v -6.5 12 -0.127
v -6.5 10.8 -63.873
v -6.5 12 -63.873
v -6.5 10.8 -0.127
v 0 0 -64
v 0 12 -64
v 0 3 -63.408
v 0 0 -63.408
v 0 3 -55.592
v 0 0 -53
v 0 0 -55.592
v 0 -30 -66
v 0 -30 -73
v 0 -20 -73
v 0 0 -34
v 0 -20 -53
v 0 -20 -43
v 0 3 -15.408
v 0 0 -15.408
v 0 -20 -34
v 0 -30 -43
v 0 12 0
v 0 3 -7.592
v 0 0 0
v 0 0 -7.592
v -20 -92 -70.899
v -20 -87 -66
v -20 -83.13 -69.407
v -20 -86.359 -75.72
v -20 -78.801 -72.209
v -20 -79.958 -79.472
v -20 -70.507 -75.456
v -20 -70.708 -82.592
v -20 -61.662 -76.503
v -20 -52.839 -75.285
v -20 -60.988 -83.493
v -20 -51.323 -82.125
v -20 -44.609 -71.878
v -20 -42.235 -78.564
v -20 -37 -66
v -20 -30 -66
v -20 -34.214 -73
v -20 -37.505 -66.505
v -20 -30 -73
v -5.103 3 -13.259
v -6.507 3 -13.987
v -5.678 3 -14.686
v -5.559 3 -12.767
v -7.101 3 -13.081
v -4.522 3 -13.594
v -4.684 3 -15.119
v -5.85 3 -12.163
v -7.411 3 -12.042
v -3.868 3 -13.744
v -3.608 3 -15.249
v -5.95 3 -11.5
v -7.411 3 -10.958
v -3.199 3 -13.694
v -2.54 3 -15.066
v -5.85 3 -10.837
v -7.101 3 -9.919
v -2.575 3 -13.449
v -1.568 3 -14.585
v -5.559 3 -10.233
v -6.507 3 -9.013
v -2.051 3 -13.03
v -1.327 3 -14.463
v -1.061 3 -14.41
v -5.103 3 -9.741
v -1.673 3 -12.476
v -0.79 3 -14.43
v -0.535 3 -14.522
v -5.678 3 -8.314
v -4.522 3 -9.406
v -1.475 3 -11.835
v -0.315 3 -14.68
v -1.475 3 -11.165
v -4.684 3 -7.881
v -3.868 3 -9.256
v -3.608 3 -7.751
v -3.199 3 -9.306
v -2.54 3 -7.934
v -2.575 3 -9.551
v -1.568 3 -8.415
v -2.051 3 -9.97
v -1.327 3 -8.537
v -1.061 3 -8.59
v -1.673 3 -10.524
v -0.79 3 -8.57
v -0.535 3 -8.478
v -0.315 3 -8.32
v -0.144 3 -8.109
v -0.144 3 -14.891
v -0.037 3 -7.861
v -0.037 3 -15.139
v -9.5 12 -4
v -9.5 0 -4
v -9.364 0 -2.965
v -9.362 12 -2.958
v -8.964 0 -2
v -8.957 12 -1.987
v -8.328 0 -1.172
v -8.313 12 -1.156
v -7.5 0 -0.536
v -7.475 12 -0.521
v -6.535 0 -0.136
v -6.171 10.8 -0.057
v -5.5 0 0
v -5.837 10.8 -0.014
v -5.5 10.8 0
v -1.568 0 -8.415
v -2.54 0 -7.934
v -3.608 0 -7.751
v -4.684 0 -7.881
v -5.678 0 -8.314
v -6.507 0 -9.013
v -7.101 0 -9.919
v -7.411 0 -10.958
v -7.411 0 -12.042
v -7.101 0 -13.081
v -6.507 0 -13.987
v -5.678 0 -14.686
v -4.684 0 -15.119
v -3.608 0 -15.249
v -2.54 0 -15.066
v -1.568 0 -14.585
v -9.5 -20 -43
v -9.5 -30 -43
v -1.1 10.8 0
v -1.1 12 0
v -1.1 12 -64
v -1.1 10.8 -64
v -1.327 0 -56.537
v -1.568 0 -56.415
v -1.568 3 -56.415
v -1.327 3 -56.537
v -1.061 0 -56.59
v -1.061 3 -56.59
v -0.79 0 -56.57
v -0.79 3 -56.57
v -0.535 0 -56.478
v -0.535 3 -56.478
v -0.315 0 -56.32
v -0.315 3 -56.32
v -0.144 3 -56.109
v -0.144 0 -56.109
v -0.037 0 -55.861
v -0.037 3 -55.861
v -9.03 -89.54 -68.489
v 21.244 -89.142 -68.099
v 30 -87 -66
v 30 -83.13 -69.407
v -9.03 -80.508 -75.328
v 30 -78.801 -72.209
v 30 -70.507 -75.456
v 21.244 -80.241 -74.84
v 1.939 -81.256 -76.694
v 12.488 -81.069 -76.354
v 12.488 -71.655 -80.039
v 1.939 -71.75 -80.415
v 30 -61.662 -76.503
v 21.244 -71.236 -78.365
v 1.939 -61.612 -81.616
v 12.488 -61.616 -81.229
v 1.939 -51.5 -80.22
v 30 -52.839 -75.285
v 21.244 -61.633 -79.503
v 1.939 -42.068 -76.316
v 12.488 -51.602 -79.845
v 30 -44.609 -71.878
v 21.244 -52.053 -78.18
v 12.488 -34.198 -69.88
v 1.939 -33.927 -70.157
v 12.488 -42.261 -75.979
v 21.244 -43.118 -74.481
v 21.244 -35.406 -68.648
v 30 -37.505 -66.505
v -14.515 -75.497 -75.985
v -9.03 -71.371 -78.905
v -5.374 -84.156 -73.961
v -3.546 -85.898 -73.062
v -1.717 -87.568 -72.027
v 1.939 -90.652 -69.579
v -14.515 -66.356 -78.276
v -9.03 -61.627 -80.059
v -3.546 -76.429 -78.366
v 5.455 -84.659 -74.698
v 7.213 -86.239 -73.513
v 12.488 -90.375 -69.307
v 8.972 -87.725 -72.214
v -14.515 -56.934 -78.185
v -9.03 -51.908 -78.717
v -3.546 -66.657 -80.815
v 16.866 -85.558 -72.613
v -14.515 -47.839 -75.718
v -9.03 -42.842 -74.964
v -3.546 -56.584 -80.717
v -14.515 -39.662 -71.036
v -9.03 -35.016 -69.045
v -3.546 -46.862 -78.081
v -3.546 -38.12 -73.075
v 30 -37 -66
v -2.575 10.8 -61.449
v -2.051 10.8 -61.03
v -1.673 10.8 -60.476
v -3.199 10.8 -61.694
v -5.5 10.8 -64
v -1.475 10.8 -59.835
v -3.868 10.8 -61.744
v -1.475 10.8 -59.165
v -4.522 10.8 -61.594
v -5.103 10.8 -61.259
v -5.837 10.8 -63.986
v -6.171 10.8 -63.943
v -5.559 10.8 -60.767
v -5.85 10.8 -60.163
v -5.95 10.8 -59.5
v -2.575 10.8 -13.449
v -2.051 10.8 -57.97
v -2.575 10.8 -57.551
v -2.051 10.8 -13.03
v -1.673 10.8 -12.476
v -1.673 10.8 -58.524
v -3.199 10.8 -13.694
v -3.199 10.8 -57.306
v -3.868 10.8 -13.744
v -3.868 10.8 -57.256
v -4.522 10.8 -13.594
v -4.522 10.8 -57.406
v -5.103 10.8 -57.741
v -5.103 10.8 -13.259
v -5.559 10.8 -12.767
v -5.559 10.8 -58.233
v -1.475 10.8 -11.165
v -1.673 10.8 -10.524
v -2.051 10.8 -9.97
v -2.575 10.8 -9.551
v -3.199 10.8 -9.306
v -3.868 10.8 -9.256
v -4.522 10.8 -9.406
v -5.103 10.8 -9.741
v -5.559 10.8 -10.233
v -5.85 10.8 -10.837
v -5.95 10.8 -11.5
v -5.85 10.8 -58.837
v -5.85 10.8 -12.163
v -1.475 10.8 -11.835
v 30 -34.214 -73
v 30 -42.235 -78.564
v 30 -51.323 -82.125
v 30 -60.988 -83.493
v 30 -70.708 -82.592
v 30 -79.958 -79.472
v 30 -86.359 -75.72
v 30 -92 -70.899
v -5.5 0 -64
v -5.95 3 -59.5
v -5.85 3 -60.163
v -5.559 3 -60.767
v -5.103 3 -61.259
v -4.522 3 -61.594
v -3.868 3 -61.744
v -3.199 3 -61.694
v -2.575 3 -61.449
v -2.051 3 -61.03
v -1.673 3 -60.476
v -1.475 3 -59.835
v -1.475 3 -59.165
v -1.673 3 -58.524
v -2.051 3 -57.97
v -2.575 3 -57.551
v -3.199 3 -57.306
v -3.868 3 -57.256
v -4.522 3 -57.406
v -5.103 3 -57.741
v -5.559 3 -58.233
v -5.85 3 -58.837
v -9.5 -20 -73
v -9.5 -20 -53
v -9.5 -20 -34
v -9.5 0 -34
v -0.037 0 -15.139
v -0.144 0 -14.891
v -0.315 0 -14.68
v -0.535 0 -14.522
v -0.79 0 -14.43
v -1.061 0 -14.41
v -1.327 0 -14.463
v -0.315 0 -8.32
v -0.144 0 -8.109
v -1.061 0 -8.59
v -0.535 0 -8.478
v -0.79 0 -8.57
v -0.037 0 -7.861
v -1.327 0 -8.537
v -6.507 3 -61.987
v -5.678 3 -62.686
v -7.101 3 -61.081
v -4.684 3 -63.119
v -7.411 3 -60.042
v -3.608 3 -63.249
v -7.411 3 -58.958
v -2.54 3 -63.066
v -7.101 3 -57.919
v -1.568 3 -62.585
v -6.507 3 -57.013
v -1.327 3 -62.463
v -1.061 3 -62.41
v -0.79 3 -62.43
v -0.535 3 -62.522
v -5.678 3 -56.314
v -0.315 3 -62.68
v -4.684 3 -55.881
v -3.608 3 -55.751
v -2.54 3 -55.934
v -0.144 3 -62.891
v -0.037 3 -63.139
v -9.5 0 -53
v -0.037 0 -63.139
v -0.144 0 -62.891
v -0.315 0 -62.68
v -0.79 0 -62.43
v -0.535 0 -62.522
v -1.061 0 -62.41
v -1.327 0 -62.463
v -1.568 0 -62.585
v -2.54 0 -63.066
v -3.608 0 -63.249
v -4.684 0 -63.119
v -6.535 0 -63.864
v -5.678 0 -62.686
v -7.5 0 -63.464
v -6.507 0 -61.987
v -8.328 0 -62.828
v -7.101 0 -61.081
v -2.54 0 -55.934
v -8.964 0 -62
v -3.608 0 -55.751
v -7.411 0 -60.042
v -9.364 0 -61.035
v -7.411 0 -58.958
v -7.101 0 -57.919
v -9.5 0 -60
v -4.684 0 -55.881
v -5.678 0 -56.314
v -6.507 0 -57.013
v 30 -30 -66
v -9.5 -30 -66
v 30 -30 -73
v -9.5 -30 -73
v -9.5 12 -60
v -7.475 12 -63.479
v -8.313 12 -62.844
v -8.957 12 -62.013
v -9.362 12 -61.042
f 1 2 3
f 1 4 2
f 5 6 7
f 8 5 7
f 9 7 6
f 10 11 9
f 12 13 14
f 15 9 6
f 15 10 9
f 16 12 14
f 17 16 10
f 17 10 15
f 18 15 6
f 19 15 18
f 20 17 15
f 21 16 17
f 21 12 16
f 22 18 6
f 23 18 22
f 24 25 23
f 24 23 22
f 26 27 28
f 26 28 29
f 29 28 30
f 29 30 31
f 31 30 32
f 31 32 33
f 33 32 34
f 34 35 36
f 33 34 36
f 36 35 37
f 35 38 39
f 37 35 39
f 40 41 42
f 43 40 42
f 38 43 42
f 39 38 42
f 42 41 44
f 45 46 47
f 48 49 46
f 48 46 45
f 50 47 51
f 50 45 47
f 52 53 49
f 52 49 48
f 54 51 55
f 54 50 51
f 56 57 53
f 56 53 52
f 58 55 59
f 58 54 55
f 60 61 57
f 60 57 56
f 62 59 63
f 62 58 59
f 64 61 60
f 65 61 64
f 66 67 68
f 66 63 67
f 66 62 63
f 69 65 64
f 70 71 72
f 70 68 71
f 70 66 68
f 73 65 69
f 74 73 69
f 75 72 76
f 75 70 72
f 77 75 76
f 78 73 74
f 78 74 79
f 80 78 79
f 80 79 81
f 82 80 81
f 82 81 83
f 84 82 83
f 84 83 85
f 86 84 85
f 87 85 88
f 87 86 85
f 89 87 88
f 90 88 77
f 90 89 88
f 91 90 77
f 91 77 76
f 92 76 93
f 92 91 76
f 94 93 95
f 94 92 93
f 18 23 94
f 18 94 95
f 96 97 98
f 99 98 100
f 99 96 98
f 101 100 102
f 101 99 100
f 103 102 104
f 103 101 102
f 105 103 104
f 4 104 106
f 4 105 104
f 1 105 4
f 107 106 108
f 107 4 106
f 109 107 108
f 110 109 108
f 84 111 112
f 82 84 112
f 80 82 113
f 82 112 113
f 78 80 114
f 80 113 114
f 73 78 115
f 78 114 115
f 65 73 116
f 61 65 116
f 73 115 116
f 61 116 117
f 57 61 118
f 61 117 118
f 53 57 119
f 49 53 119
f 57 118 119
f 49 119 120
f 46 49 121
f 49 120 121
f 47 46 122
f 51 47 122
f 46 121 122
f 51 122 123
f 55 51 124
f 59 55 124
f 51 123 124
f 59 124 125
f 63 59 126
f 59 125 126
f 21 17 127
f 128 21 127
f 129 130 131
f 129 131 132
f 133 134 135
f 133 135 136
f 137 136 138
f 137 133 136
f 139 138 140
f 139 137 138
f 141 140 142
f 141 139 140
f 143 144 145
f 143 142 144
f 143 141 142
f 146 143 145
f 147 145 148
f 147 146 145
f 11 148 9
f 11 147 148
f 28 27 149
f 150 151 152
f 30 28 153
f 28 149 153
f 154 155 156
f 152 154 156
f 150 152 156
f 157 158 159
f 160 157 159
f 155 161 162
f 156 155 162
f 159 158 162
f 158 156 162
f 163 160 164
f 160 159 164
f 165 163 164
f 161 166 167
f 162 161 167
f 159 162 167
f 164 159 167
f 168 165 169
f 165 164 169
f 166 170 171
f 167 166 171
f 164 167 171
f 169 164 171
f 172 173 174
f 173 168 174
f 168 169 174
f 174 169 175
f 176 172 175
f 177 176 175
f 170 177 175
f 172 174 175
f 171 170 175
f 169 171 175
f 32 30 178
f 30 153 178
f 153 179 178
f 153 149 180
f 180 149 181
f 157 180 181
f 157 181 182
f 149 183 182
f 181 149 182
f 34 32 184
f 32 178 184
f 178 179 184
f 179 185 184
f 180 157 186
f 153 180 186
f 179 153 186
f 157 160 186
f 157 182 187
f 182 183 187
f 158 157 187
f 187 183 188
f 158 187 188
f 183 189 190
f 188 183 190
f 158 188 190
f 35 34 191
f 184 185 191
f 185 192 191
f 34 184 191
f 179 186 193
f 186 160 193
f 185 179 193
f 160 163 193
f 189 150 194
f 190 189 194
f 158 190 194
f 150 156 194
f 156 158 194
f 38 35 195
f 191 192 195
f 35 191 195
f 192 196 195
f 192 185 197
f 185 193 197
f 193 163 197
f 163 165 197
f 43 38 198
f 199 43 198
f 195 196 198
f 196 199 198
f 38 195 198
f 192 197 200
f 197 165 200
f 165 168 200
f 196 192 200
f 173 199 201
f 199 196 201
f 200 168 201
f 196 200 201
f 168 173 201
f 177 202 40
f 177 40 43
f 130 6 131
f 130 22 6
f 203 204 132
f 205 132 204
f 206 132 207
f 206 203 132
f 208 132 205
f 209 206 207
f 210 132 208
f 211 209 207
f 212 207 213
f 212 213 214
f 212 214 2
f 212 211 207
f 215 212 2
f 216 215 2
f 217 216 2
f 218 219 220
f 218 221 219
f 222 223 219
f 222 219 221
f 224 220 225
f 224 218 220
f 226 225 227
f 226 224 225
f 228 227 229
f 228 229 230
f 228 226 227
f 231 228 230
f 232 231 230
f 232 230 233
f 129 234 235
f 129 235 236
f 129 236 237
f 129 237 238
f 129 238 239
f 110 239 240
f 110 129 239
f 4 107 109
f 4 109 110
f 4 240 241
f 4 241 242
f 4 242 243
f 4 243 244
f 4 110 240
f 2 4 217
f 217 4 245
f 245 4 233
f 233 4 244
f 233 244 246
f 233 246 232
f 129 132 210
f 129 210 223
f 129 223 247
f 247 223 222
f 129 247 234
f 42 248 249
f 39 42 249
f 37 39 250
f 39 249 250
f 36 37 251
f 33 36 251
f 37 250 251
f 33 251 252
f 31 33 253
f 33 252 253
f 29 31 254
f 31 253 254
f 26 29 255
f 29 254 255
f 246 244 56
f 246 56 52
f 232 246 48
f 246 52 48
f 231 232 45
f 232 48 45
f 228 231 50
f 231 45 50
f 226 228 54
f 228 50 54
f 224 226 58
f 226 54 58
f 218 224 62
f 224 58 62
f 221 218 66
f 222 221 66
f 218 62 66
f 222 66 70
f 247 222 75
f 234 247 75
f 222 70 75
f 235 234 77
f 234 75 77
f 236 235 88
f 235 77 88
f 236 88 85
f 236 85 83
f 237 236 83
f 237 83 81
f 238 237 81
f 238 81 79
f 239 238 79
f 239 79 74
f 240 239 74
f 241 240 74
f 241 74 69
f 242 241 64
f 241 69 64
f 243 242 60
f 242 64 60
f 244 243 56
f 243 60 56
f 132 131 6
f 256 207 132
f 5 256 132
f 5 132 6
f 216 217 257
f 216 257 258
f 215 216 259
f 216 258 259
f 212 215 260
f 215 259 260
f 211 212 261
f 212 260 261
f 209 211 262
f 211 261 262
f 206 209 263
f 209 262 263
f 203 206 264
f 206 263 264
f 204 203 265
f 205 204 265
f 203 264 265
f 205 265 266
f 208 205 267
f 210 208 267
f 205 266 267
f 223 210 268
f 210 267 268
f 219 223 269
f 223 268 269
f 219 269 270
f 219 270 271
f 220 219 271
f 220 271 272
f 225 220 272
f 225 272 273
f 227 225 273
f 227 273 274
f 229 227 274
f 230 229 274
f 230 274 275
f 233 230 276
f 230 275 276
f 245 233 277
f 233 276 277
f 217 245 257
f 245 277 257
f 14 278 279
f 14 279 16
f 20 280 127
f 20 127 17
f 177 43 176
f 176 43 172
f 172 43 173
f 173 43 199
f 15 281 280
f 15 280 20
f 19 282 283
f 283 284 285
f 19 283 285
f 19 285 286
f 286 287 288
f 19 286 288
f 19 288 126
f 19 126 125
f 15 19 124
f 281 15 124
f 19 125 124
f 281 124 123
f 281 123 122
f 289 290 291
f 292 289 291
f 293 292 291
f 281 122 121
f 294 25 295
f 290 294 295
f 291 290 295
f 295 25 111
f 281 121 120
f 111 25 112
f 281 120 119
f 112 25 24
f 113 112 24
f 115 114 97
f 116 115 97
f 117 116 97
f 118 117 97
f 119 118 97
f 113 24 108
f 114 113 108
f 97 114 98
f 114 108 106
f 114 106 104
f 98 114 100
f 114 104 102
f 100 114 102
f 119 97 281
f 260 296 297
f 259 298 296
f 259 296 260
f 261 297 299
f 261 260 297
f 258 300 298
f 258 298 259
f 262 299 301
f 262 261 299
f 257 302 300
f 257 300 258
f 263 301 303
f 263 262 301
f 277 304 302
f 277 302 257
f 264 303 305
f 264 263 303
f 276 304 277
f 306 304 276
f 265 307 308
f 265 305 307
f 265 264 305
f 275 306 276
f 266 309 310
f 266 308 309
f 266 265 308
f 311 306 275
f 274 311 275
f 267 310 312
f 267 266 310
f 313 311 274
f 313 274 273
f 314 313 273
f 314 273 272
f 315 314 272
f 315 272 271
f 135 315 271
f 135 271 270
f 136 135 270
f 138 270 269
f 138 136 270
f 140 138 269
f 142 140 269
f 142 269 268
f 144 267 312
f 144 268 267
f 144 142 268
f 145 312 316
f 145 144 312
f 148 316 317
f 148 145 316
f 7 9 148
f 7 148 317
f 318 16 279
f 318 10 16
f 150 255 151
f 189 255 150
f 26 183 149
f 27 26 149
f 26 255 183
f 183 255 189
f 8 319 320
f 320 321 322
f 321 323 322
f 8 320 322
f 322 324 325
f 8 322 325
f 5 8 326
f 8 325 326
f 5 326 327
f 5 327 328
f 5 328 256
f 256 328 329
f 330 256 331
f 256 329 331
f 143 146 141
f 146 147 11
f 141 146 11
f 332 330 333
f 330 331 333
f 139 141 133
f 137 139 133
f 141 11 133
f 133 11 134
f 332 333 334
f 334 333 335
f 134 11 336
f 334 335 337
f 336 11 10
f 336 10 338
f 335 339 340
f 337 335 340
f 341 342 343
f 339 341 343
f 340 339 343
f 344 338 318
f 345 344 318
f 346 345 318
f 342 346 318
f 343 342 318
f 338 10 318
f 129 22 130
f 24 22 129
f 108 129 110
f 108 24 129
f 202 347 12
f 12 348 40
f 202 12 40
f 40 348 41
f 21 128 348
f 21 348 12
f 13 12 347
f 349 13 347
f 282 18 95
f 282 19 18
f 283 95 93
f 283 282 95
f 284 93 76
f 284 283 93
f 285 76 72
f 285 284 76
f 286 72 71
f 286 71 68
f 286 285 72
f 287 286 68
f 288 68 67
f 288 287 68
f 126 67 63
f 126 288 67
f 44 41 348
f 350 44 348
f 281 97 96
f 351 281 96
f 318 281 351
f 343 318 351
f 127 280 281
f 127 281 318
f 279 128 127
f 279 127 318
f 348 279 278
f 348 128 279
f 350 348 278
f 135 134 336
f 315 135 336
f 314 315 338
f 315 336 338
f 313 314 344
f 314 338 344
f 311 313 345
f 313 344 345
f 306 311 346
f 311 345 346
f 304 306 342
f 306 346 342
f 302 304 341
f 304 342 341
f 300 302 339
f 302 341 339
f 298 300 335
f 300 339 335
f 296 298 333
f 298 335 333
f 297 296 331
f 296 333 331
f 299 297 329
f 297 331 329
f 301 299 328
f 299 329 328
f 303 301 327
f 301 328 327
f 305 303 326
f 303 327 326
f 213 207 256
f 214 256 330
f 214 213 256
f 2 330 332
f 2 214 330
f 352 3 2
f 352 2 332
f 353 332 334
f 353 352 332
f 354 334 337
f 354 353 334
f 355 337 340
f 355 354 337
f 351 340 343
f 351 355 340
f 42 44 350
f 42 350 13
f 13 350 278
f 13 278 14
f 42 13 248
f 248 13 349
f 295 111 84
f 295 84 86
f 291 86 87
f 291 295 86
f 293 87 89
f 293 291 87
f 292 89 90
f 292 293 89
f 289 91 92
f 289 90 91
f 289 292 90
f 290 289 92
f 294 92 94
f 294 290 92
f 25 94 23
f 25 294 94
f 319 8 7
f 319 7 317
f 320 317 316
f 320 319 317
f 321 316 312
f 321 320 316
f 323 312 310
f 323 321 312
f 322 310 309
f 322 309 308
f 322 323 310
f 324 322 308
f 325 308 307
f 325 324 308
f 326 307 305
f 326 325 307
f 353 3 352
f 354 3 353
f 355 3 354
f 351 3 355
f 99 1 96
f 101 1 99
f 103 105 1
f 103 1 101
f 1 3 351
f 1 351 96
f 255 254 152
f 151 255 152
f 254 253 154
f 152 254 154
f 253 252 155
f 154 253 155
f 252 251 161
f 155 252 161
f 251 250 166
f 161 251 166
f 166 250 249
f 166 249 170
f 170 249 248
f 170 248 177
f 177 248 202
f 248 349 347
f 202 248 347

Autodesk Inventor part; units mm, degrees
ref_plane "YZ Plane" through (0, 0, 0) normal (1, 0, 0) x (0, 1, 0)
ref_plane "XZ Plane" through (0, 0, 0) normal (0, 1, 0) x (-1, 0, 0)
ref_plane "XY Plane" through (0, 0, 0) normal (0, 0, 1) x (1, 0, 0)
sketch "Sketch1" plane through (0, 0, 0) normal (0, 1, 0) x (-1, 0, 0)
  line L0 (0, 0) -> (9.5, 0)
  line L1 (9.5, 0) -> (9.5, -64)
  line L2 (9.5, -64) -> (0, -64)
  line L3 (0, -64) -> (0, 0)
  circle A0 centre (3.7, -11.5) radius 2.25
  circle A1 centre (3.7, -59.5) radius 2.25
  line L4 (3.7, -11.5) -> (3.7, -59.5) construction
  dimension "d1" = 9.5
  dimension "d2" = 64
  dimension "d3" = 4.5
  dimension "d4" = 48
  dimension "d6" = 3.7
  dimension "d17" = 4.5
extrude "Extrusion1" add sketch "Sketch1" along normal blind 12
sketch "Sketch2" plane through (-9.5, 0, 0) normal (0, 0, 1) x (1, 0, 0)
  line L0 (9.5, 12) -> (0, 12) projected
  line L1 (3, 12) -> (8.4, 12)
  line L2 (8.4, 12) -> (8.4, 10.8)
  line L3 (8.4, 10.8) -> (3, 10.8)
  line L4 (3, 10.8) -> (3, 12)
  line L5 (9.5, 0) -> (9.5, 12) projected
  line L6 (3.55, 0) -> (8.05, 0) projected
  line L7 (3.55, 12) -> (8.05, 12) projected
  line L8 (9.5, 0) -> (9.5, 12) projected
  line L9 (9.5, 0) -> (9.5, 12) projected
  line L10 (3.55, 12) -> (8.05, 12) projected
  line L11 (3.55, 12) -> (3.55, 0) projected
  line L12 (3.55, 12) -> (8.05, 12) projected
  line L13 (3.55, 0) -> (8.05, 0) projected
  line L14 (3.55, 12) -> (8.05, 12) projected
  line L15 (3.55, 0) -> (8.05, 0) projected
  line L16 (3.55, 12) -> (8.05, 12) projected
  line L17 (3.55, 0) -> (8.05, 0) projected
  dimension "d9" = 1.1
  dimension "d10" = 5.4
  dimension "d11" = 1.2
  dimension "d76" = 12
extrude "Extrusion2" cut sketch "Sketch2" against normal up to next
sketch "Sketch3" plane through (0, 0, 0) normal (0, -1, 0) x (1, 0, 0)
  circle A0 centre (-3.7, -11.5) radius 2.25 projected
  circle A1 centre (-3.7, -11.5) radius 3.75
  circle A2 centre (-3.7, -59.5) radius 2.25 projected
  circle A3 centre (-3.7, -59.5) radius 3.75
  point P0 (0, 0)
  dimension "d14" = 7.5
extrude "Extrusion3" cut sketch "Sketch3" against normal blind 3
fillet "Fillet1" radius 1 4 edges at (0, 1.5, -58.8897) (0, 1.5, -60.1103) (0, 1.5, -10.8897) (0, 1.5, -12.1103)
fillet "Fillet2" radius 4 2 edges at (-9.5, 6, -64) (-9.5, 6, 0)
sketch "Sketch28" plane through (0, 0, 0) normal (0, -1, 0) x (1, 0, 0)
  arc A0 (-1.5684, -56.4147) -> (0, -55.592) centre (-1, -55.592) ccw projected
  line L0 (0, -55.592) -> (0, -53)
  line L1 (0, -15.408) -> (0, -55.592) projected
  line L2 (-9.5, -60) -> (-9.5, -4) projected
  line L3 (0, -53) -> (-9.5, -53)
  line L4 (-9.5, -53) -> (-9.5, -34)
  line L5 (-9.5, -34) -> (0, -34)
  line L6 (0, -34) -> (0, -53)
  point P0 (0, 0)
  point P1 (0, -34)
  dimension "d107" = 2.592
  dimension "d108" = 19
extrude "Extrusion19" add sketch "Sketch28" along normal blind 20
sketch "Sketch40" plane through (0, -20, 0) normal (0, -1, 0) x (1, 0, 0)
  line L0 (0, -53) -> (-9.5, -53) projected
  line L1 (-9.5, -53) -> (-9.5, -73)
  line L2 (-9.5, -73) -> (0, -73)
  line L3 (0, -73) -> (0, -43)
  line L4 (0, 0) -> (0, -64) projected
  line L5 (0, -43) -> (-9.5, -43)
  line L6 (-9.5, -43) -> (-9.5, -53)
  line L7 (-9.5, -43) -> (0, -43)
  line L8 (0, -43) -> (0, -73)
  line L9 (0, -73) -> (-9.5, -73)
  line L10 (-9.5, -73) -> (-9.5, -43)
  dimension "d130" = 20
  dimension "d131" = 30
extrude "Extrusion21" add sketch "Sketch40" along normal blind 10
sketch "Sketch41" plane through (0, 0, -53) normal (0, 0, -1) x (-1, 0, 0)
  point P0 (0, 0)
sketch "Sketch42" plane through (0, -30, 0) normal (0, -1, 0) x (1, 0, 0)
  line L0 (0, -73) -> (0, -53) projected
  line L1 (0, -73) -> (30, -73)
  line L2 (30, -73) -> (30, -66)
  line L3 (30, -66) -> (-20, -66)
  line L4 (-20, -66) -> (-20, -73)
  line L5 (-20, -73) -> (0, -73)
  point P0 (0, 0)
  dimension "d134" = 30
  dimension "d135" = 7
  dimension "d137" = 50
extrude "Extrusion22" add sketch "Sketch42" along normal blind 7
sketch "Sketch44" plane through (0, -37, 0) normal (0, -1, 0) x (1, 0, 0)
  line L0 (-20, -73) -> (30, -73) projected
  line L1 (30, -66) -> (-20, -66) projected
  line L2 (-20, -73) -> (30, -73)
  line L3 (30, -73) -> (30, -66)
  line L4 (30, -66) -> (-20, -66)
  line L5 (-20, -66) -> (-20, -73)
  point P0 (0, 0)
sketch "Sketch45" plane through (-20, -30, -73) normal (-1, 0, 0) x (0, 0, 1)
  line L0 (7, 0) -> (7, -7) projected
  arc A0 (7, -7) -> (7, -57) centre (31.4949, -32) ccw
  point P0 (73, 30)
  dimension "d142" = 50
  dimension "d143" = 35
sweep "Sweep3" add profiles "Sketch44" path "Sketch45"
sketch "Sketch46" plane through (-20, -87, -66) normal (0, -0.6998542, 0.7142857) x (1, 0, 0)
  line L0 (0, 35.7143) -> (0, 0) projected
  line L1 (0, 0) -> (25, -10.3821) construction
  line L2 (50, 0) -> (0, 0) projected
  line L3 (25, -10.3821) -> (50, 0) construction
  spline S0 degree 2 poles (0, 0) (25, -10.3821) (50, 0) knots 1 1 1 2 2 2
  line L4 (0, 0) -> (50, 0)
  line L5 (60.7, 35) -> (-10.7, 35) projected
  point P0 (20, 108.3332)
revolve "Revolution1" cut sketch "Sketch46" angle 90 about axis through (5, -62, -41.5051) along (1, 0, 0)
sketch "Sketch47" plane through (-20, -92, -70.899) normal (0, -0.6998542, 0.7142857) x (1, 0, 0)
  point P0 (20, 115.3332)
properties part number "Back"
